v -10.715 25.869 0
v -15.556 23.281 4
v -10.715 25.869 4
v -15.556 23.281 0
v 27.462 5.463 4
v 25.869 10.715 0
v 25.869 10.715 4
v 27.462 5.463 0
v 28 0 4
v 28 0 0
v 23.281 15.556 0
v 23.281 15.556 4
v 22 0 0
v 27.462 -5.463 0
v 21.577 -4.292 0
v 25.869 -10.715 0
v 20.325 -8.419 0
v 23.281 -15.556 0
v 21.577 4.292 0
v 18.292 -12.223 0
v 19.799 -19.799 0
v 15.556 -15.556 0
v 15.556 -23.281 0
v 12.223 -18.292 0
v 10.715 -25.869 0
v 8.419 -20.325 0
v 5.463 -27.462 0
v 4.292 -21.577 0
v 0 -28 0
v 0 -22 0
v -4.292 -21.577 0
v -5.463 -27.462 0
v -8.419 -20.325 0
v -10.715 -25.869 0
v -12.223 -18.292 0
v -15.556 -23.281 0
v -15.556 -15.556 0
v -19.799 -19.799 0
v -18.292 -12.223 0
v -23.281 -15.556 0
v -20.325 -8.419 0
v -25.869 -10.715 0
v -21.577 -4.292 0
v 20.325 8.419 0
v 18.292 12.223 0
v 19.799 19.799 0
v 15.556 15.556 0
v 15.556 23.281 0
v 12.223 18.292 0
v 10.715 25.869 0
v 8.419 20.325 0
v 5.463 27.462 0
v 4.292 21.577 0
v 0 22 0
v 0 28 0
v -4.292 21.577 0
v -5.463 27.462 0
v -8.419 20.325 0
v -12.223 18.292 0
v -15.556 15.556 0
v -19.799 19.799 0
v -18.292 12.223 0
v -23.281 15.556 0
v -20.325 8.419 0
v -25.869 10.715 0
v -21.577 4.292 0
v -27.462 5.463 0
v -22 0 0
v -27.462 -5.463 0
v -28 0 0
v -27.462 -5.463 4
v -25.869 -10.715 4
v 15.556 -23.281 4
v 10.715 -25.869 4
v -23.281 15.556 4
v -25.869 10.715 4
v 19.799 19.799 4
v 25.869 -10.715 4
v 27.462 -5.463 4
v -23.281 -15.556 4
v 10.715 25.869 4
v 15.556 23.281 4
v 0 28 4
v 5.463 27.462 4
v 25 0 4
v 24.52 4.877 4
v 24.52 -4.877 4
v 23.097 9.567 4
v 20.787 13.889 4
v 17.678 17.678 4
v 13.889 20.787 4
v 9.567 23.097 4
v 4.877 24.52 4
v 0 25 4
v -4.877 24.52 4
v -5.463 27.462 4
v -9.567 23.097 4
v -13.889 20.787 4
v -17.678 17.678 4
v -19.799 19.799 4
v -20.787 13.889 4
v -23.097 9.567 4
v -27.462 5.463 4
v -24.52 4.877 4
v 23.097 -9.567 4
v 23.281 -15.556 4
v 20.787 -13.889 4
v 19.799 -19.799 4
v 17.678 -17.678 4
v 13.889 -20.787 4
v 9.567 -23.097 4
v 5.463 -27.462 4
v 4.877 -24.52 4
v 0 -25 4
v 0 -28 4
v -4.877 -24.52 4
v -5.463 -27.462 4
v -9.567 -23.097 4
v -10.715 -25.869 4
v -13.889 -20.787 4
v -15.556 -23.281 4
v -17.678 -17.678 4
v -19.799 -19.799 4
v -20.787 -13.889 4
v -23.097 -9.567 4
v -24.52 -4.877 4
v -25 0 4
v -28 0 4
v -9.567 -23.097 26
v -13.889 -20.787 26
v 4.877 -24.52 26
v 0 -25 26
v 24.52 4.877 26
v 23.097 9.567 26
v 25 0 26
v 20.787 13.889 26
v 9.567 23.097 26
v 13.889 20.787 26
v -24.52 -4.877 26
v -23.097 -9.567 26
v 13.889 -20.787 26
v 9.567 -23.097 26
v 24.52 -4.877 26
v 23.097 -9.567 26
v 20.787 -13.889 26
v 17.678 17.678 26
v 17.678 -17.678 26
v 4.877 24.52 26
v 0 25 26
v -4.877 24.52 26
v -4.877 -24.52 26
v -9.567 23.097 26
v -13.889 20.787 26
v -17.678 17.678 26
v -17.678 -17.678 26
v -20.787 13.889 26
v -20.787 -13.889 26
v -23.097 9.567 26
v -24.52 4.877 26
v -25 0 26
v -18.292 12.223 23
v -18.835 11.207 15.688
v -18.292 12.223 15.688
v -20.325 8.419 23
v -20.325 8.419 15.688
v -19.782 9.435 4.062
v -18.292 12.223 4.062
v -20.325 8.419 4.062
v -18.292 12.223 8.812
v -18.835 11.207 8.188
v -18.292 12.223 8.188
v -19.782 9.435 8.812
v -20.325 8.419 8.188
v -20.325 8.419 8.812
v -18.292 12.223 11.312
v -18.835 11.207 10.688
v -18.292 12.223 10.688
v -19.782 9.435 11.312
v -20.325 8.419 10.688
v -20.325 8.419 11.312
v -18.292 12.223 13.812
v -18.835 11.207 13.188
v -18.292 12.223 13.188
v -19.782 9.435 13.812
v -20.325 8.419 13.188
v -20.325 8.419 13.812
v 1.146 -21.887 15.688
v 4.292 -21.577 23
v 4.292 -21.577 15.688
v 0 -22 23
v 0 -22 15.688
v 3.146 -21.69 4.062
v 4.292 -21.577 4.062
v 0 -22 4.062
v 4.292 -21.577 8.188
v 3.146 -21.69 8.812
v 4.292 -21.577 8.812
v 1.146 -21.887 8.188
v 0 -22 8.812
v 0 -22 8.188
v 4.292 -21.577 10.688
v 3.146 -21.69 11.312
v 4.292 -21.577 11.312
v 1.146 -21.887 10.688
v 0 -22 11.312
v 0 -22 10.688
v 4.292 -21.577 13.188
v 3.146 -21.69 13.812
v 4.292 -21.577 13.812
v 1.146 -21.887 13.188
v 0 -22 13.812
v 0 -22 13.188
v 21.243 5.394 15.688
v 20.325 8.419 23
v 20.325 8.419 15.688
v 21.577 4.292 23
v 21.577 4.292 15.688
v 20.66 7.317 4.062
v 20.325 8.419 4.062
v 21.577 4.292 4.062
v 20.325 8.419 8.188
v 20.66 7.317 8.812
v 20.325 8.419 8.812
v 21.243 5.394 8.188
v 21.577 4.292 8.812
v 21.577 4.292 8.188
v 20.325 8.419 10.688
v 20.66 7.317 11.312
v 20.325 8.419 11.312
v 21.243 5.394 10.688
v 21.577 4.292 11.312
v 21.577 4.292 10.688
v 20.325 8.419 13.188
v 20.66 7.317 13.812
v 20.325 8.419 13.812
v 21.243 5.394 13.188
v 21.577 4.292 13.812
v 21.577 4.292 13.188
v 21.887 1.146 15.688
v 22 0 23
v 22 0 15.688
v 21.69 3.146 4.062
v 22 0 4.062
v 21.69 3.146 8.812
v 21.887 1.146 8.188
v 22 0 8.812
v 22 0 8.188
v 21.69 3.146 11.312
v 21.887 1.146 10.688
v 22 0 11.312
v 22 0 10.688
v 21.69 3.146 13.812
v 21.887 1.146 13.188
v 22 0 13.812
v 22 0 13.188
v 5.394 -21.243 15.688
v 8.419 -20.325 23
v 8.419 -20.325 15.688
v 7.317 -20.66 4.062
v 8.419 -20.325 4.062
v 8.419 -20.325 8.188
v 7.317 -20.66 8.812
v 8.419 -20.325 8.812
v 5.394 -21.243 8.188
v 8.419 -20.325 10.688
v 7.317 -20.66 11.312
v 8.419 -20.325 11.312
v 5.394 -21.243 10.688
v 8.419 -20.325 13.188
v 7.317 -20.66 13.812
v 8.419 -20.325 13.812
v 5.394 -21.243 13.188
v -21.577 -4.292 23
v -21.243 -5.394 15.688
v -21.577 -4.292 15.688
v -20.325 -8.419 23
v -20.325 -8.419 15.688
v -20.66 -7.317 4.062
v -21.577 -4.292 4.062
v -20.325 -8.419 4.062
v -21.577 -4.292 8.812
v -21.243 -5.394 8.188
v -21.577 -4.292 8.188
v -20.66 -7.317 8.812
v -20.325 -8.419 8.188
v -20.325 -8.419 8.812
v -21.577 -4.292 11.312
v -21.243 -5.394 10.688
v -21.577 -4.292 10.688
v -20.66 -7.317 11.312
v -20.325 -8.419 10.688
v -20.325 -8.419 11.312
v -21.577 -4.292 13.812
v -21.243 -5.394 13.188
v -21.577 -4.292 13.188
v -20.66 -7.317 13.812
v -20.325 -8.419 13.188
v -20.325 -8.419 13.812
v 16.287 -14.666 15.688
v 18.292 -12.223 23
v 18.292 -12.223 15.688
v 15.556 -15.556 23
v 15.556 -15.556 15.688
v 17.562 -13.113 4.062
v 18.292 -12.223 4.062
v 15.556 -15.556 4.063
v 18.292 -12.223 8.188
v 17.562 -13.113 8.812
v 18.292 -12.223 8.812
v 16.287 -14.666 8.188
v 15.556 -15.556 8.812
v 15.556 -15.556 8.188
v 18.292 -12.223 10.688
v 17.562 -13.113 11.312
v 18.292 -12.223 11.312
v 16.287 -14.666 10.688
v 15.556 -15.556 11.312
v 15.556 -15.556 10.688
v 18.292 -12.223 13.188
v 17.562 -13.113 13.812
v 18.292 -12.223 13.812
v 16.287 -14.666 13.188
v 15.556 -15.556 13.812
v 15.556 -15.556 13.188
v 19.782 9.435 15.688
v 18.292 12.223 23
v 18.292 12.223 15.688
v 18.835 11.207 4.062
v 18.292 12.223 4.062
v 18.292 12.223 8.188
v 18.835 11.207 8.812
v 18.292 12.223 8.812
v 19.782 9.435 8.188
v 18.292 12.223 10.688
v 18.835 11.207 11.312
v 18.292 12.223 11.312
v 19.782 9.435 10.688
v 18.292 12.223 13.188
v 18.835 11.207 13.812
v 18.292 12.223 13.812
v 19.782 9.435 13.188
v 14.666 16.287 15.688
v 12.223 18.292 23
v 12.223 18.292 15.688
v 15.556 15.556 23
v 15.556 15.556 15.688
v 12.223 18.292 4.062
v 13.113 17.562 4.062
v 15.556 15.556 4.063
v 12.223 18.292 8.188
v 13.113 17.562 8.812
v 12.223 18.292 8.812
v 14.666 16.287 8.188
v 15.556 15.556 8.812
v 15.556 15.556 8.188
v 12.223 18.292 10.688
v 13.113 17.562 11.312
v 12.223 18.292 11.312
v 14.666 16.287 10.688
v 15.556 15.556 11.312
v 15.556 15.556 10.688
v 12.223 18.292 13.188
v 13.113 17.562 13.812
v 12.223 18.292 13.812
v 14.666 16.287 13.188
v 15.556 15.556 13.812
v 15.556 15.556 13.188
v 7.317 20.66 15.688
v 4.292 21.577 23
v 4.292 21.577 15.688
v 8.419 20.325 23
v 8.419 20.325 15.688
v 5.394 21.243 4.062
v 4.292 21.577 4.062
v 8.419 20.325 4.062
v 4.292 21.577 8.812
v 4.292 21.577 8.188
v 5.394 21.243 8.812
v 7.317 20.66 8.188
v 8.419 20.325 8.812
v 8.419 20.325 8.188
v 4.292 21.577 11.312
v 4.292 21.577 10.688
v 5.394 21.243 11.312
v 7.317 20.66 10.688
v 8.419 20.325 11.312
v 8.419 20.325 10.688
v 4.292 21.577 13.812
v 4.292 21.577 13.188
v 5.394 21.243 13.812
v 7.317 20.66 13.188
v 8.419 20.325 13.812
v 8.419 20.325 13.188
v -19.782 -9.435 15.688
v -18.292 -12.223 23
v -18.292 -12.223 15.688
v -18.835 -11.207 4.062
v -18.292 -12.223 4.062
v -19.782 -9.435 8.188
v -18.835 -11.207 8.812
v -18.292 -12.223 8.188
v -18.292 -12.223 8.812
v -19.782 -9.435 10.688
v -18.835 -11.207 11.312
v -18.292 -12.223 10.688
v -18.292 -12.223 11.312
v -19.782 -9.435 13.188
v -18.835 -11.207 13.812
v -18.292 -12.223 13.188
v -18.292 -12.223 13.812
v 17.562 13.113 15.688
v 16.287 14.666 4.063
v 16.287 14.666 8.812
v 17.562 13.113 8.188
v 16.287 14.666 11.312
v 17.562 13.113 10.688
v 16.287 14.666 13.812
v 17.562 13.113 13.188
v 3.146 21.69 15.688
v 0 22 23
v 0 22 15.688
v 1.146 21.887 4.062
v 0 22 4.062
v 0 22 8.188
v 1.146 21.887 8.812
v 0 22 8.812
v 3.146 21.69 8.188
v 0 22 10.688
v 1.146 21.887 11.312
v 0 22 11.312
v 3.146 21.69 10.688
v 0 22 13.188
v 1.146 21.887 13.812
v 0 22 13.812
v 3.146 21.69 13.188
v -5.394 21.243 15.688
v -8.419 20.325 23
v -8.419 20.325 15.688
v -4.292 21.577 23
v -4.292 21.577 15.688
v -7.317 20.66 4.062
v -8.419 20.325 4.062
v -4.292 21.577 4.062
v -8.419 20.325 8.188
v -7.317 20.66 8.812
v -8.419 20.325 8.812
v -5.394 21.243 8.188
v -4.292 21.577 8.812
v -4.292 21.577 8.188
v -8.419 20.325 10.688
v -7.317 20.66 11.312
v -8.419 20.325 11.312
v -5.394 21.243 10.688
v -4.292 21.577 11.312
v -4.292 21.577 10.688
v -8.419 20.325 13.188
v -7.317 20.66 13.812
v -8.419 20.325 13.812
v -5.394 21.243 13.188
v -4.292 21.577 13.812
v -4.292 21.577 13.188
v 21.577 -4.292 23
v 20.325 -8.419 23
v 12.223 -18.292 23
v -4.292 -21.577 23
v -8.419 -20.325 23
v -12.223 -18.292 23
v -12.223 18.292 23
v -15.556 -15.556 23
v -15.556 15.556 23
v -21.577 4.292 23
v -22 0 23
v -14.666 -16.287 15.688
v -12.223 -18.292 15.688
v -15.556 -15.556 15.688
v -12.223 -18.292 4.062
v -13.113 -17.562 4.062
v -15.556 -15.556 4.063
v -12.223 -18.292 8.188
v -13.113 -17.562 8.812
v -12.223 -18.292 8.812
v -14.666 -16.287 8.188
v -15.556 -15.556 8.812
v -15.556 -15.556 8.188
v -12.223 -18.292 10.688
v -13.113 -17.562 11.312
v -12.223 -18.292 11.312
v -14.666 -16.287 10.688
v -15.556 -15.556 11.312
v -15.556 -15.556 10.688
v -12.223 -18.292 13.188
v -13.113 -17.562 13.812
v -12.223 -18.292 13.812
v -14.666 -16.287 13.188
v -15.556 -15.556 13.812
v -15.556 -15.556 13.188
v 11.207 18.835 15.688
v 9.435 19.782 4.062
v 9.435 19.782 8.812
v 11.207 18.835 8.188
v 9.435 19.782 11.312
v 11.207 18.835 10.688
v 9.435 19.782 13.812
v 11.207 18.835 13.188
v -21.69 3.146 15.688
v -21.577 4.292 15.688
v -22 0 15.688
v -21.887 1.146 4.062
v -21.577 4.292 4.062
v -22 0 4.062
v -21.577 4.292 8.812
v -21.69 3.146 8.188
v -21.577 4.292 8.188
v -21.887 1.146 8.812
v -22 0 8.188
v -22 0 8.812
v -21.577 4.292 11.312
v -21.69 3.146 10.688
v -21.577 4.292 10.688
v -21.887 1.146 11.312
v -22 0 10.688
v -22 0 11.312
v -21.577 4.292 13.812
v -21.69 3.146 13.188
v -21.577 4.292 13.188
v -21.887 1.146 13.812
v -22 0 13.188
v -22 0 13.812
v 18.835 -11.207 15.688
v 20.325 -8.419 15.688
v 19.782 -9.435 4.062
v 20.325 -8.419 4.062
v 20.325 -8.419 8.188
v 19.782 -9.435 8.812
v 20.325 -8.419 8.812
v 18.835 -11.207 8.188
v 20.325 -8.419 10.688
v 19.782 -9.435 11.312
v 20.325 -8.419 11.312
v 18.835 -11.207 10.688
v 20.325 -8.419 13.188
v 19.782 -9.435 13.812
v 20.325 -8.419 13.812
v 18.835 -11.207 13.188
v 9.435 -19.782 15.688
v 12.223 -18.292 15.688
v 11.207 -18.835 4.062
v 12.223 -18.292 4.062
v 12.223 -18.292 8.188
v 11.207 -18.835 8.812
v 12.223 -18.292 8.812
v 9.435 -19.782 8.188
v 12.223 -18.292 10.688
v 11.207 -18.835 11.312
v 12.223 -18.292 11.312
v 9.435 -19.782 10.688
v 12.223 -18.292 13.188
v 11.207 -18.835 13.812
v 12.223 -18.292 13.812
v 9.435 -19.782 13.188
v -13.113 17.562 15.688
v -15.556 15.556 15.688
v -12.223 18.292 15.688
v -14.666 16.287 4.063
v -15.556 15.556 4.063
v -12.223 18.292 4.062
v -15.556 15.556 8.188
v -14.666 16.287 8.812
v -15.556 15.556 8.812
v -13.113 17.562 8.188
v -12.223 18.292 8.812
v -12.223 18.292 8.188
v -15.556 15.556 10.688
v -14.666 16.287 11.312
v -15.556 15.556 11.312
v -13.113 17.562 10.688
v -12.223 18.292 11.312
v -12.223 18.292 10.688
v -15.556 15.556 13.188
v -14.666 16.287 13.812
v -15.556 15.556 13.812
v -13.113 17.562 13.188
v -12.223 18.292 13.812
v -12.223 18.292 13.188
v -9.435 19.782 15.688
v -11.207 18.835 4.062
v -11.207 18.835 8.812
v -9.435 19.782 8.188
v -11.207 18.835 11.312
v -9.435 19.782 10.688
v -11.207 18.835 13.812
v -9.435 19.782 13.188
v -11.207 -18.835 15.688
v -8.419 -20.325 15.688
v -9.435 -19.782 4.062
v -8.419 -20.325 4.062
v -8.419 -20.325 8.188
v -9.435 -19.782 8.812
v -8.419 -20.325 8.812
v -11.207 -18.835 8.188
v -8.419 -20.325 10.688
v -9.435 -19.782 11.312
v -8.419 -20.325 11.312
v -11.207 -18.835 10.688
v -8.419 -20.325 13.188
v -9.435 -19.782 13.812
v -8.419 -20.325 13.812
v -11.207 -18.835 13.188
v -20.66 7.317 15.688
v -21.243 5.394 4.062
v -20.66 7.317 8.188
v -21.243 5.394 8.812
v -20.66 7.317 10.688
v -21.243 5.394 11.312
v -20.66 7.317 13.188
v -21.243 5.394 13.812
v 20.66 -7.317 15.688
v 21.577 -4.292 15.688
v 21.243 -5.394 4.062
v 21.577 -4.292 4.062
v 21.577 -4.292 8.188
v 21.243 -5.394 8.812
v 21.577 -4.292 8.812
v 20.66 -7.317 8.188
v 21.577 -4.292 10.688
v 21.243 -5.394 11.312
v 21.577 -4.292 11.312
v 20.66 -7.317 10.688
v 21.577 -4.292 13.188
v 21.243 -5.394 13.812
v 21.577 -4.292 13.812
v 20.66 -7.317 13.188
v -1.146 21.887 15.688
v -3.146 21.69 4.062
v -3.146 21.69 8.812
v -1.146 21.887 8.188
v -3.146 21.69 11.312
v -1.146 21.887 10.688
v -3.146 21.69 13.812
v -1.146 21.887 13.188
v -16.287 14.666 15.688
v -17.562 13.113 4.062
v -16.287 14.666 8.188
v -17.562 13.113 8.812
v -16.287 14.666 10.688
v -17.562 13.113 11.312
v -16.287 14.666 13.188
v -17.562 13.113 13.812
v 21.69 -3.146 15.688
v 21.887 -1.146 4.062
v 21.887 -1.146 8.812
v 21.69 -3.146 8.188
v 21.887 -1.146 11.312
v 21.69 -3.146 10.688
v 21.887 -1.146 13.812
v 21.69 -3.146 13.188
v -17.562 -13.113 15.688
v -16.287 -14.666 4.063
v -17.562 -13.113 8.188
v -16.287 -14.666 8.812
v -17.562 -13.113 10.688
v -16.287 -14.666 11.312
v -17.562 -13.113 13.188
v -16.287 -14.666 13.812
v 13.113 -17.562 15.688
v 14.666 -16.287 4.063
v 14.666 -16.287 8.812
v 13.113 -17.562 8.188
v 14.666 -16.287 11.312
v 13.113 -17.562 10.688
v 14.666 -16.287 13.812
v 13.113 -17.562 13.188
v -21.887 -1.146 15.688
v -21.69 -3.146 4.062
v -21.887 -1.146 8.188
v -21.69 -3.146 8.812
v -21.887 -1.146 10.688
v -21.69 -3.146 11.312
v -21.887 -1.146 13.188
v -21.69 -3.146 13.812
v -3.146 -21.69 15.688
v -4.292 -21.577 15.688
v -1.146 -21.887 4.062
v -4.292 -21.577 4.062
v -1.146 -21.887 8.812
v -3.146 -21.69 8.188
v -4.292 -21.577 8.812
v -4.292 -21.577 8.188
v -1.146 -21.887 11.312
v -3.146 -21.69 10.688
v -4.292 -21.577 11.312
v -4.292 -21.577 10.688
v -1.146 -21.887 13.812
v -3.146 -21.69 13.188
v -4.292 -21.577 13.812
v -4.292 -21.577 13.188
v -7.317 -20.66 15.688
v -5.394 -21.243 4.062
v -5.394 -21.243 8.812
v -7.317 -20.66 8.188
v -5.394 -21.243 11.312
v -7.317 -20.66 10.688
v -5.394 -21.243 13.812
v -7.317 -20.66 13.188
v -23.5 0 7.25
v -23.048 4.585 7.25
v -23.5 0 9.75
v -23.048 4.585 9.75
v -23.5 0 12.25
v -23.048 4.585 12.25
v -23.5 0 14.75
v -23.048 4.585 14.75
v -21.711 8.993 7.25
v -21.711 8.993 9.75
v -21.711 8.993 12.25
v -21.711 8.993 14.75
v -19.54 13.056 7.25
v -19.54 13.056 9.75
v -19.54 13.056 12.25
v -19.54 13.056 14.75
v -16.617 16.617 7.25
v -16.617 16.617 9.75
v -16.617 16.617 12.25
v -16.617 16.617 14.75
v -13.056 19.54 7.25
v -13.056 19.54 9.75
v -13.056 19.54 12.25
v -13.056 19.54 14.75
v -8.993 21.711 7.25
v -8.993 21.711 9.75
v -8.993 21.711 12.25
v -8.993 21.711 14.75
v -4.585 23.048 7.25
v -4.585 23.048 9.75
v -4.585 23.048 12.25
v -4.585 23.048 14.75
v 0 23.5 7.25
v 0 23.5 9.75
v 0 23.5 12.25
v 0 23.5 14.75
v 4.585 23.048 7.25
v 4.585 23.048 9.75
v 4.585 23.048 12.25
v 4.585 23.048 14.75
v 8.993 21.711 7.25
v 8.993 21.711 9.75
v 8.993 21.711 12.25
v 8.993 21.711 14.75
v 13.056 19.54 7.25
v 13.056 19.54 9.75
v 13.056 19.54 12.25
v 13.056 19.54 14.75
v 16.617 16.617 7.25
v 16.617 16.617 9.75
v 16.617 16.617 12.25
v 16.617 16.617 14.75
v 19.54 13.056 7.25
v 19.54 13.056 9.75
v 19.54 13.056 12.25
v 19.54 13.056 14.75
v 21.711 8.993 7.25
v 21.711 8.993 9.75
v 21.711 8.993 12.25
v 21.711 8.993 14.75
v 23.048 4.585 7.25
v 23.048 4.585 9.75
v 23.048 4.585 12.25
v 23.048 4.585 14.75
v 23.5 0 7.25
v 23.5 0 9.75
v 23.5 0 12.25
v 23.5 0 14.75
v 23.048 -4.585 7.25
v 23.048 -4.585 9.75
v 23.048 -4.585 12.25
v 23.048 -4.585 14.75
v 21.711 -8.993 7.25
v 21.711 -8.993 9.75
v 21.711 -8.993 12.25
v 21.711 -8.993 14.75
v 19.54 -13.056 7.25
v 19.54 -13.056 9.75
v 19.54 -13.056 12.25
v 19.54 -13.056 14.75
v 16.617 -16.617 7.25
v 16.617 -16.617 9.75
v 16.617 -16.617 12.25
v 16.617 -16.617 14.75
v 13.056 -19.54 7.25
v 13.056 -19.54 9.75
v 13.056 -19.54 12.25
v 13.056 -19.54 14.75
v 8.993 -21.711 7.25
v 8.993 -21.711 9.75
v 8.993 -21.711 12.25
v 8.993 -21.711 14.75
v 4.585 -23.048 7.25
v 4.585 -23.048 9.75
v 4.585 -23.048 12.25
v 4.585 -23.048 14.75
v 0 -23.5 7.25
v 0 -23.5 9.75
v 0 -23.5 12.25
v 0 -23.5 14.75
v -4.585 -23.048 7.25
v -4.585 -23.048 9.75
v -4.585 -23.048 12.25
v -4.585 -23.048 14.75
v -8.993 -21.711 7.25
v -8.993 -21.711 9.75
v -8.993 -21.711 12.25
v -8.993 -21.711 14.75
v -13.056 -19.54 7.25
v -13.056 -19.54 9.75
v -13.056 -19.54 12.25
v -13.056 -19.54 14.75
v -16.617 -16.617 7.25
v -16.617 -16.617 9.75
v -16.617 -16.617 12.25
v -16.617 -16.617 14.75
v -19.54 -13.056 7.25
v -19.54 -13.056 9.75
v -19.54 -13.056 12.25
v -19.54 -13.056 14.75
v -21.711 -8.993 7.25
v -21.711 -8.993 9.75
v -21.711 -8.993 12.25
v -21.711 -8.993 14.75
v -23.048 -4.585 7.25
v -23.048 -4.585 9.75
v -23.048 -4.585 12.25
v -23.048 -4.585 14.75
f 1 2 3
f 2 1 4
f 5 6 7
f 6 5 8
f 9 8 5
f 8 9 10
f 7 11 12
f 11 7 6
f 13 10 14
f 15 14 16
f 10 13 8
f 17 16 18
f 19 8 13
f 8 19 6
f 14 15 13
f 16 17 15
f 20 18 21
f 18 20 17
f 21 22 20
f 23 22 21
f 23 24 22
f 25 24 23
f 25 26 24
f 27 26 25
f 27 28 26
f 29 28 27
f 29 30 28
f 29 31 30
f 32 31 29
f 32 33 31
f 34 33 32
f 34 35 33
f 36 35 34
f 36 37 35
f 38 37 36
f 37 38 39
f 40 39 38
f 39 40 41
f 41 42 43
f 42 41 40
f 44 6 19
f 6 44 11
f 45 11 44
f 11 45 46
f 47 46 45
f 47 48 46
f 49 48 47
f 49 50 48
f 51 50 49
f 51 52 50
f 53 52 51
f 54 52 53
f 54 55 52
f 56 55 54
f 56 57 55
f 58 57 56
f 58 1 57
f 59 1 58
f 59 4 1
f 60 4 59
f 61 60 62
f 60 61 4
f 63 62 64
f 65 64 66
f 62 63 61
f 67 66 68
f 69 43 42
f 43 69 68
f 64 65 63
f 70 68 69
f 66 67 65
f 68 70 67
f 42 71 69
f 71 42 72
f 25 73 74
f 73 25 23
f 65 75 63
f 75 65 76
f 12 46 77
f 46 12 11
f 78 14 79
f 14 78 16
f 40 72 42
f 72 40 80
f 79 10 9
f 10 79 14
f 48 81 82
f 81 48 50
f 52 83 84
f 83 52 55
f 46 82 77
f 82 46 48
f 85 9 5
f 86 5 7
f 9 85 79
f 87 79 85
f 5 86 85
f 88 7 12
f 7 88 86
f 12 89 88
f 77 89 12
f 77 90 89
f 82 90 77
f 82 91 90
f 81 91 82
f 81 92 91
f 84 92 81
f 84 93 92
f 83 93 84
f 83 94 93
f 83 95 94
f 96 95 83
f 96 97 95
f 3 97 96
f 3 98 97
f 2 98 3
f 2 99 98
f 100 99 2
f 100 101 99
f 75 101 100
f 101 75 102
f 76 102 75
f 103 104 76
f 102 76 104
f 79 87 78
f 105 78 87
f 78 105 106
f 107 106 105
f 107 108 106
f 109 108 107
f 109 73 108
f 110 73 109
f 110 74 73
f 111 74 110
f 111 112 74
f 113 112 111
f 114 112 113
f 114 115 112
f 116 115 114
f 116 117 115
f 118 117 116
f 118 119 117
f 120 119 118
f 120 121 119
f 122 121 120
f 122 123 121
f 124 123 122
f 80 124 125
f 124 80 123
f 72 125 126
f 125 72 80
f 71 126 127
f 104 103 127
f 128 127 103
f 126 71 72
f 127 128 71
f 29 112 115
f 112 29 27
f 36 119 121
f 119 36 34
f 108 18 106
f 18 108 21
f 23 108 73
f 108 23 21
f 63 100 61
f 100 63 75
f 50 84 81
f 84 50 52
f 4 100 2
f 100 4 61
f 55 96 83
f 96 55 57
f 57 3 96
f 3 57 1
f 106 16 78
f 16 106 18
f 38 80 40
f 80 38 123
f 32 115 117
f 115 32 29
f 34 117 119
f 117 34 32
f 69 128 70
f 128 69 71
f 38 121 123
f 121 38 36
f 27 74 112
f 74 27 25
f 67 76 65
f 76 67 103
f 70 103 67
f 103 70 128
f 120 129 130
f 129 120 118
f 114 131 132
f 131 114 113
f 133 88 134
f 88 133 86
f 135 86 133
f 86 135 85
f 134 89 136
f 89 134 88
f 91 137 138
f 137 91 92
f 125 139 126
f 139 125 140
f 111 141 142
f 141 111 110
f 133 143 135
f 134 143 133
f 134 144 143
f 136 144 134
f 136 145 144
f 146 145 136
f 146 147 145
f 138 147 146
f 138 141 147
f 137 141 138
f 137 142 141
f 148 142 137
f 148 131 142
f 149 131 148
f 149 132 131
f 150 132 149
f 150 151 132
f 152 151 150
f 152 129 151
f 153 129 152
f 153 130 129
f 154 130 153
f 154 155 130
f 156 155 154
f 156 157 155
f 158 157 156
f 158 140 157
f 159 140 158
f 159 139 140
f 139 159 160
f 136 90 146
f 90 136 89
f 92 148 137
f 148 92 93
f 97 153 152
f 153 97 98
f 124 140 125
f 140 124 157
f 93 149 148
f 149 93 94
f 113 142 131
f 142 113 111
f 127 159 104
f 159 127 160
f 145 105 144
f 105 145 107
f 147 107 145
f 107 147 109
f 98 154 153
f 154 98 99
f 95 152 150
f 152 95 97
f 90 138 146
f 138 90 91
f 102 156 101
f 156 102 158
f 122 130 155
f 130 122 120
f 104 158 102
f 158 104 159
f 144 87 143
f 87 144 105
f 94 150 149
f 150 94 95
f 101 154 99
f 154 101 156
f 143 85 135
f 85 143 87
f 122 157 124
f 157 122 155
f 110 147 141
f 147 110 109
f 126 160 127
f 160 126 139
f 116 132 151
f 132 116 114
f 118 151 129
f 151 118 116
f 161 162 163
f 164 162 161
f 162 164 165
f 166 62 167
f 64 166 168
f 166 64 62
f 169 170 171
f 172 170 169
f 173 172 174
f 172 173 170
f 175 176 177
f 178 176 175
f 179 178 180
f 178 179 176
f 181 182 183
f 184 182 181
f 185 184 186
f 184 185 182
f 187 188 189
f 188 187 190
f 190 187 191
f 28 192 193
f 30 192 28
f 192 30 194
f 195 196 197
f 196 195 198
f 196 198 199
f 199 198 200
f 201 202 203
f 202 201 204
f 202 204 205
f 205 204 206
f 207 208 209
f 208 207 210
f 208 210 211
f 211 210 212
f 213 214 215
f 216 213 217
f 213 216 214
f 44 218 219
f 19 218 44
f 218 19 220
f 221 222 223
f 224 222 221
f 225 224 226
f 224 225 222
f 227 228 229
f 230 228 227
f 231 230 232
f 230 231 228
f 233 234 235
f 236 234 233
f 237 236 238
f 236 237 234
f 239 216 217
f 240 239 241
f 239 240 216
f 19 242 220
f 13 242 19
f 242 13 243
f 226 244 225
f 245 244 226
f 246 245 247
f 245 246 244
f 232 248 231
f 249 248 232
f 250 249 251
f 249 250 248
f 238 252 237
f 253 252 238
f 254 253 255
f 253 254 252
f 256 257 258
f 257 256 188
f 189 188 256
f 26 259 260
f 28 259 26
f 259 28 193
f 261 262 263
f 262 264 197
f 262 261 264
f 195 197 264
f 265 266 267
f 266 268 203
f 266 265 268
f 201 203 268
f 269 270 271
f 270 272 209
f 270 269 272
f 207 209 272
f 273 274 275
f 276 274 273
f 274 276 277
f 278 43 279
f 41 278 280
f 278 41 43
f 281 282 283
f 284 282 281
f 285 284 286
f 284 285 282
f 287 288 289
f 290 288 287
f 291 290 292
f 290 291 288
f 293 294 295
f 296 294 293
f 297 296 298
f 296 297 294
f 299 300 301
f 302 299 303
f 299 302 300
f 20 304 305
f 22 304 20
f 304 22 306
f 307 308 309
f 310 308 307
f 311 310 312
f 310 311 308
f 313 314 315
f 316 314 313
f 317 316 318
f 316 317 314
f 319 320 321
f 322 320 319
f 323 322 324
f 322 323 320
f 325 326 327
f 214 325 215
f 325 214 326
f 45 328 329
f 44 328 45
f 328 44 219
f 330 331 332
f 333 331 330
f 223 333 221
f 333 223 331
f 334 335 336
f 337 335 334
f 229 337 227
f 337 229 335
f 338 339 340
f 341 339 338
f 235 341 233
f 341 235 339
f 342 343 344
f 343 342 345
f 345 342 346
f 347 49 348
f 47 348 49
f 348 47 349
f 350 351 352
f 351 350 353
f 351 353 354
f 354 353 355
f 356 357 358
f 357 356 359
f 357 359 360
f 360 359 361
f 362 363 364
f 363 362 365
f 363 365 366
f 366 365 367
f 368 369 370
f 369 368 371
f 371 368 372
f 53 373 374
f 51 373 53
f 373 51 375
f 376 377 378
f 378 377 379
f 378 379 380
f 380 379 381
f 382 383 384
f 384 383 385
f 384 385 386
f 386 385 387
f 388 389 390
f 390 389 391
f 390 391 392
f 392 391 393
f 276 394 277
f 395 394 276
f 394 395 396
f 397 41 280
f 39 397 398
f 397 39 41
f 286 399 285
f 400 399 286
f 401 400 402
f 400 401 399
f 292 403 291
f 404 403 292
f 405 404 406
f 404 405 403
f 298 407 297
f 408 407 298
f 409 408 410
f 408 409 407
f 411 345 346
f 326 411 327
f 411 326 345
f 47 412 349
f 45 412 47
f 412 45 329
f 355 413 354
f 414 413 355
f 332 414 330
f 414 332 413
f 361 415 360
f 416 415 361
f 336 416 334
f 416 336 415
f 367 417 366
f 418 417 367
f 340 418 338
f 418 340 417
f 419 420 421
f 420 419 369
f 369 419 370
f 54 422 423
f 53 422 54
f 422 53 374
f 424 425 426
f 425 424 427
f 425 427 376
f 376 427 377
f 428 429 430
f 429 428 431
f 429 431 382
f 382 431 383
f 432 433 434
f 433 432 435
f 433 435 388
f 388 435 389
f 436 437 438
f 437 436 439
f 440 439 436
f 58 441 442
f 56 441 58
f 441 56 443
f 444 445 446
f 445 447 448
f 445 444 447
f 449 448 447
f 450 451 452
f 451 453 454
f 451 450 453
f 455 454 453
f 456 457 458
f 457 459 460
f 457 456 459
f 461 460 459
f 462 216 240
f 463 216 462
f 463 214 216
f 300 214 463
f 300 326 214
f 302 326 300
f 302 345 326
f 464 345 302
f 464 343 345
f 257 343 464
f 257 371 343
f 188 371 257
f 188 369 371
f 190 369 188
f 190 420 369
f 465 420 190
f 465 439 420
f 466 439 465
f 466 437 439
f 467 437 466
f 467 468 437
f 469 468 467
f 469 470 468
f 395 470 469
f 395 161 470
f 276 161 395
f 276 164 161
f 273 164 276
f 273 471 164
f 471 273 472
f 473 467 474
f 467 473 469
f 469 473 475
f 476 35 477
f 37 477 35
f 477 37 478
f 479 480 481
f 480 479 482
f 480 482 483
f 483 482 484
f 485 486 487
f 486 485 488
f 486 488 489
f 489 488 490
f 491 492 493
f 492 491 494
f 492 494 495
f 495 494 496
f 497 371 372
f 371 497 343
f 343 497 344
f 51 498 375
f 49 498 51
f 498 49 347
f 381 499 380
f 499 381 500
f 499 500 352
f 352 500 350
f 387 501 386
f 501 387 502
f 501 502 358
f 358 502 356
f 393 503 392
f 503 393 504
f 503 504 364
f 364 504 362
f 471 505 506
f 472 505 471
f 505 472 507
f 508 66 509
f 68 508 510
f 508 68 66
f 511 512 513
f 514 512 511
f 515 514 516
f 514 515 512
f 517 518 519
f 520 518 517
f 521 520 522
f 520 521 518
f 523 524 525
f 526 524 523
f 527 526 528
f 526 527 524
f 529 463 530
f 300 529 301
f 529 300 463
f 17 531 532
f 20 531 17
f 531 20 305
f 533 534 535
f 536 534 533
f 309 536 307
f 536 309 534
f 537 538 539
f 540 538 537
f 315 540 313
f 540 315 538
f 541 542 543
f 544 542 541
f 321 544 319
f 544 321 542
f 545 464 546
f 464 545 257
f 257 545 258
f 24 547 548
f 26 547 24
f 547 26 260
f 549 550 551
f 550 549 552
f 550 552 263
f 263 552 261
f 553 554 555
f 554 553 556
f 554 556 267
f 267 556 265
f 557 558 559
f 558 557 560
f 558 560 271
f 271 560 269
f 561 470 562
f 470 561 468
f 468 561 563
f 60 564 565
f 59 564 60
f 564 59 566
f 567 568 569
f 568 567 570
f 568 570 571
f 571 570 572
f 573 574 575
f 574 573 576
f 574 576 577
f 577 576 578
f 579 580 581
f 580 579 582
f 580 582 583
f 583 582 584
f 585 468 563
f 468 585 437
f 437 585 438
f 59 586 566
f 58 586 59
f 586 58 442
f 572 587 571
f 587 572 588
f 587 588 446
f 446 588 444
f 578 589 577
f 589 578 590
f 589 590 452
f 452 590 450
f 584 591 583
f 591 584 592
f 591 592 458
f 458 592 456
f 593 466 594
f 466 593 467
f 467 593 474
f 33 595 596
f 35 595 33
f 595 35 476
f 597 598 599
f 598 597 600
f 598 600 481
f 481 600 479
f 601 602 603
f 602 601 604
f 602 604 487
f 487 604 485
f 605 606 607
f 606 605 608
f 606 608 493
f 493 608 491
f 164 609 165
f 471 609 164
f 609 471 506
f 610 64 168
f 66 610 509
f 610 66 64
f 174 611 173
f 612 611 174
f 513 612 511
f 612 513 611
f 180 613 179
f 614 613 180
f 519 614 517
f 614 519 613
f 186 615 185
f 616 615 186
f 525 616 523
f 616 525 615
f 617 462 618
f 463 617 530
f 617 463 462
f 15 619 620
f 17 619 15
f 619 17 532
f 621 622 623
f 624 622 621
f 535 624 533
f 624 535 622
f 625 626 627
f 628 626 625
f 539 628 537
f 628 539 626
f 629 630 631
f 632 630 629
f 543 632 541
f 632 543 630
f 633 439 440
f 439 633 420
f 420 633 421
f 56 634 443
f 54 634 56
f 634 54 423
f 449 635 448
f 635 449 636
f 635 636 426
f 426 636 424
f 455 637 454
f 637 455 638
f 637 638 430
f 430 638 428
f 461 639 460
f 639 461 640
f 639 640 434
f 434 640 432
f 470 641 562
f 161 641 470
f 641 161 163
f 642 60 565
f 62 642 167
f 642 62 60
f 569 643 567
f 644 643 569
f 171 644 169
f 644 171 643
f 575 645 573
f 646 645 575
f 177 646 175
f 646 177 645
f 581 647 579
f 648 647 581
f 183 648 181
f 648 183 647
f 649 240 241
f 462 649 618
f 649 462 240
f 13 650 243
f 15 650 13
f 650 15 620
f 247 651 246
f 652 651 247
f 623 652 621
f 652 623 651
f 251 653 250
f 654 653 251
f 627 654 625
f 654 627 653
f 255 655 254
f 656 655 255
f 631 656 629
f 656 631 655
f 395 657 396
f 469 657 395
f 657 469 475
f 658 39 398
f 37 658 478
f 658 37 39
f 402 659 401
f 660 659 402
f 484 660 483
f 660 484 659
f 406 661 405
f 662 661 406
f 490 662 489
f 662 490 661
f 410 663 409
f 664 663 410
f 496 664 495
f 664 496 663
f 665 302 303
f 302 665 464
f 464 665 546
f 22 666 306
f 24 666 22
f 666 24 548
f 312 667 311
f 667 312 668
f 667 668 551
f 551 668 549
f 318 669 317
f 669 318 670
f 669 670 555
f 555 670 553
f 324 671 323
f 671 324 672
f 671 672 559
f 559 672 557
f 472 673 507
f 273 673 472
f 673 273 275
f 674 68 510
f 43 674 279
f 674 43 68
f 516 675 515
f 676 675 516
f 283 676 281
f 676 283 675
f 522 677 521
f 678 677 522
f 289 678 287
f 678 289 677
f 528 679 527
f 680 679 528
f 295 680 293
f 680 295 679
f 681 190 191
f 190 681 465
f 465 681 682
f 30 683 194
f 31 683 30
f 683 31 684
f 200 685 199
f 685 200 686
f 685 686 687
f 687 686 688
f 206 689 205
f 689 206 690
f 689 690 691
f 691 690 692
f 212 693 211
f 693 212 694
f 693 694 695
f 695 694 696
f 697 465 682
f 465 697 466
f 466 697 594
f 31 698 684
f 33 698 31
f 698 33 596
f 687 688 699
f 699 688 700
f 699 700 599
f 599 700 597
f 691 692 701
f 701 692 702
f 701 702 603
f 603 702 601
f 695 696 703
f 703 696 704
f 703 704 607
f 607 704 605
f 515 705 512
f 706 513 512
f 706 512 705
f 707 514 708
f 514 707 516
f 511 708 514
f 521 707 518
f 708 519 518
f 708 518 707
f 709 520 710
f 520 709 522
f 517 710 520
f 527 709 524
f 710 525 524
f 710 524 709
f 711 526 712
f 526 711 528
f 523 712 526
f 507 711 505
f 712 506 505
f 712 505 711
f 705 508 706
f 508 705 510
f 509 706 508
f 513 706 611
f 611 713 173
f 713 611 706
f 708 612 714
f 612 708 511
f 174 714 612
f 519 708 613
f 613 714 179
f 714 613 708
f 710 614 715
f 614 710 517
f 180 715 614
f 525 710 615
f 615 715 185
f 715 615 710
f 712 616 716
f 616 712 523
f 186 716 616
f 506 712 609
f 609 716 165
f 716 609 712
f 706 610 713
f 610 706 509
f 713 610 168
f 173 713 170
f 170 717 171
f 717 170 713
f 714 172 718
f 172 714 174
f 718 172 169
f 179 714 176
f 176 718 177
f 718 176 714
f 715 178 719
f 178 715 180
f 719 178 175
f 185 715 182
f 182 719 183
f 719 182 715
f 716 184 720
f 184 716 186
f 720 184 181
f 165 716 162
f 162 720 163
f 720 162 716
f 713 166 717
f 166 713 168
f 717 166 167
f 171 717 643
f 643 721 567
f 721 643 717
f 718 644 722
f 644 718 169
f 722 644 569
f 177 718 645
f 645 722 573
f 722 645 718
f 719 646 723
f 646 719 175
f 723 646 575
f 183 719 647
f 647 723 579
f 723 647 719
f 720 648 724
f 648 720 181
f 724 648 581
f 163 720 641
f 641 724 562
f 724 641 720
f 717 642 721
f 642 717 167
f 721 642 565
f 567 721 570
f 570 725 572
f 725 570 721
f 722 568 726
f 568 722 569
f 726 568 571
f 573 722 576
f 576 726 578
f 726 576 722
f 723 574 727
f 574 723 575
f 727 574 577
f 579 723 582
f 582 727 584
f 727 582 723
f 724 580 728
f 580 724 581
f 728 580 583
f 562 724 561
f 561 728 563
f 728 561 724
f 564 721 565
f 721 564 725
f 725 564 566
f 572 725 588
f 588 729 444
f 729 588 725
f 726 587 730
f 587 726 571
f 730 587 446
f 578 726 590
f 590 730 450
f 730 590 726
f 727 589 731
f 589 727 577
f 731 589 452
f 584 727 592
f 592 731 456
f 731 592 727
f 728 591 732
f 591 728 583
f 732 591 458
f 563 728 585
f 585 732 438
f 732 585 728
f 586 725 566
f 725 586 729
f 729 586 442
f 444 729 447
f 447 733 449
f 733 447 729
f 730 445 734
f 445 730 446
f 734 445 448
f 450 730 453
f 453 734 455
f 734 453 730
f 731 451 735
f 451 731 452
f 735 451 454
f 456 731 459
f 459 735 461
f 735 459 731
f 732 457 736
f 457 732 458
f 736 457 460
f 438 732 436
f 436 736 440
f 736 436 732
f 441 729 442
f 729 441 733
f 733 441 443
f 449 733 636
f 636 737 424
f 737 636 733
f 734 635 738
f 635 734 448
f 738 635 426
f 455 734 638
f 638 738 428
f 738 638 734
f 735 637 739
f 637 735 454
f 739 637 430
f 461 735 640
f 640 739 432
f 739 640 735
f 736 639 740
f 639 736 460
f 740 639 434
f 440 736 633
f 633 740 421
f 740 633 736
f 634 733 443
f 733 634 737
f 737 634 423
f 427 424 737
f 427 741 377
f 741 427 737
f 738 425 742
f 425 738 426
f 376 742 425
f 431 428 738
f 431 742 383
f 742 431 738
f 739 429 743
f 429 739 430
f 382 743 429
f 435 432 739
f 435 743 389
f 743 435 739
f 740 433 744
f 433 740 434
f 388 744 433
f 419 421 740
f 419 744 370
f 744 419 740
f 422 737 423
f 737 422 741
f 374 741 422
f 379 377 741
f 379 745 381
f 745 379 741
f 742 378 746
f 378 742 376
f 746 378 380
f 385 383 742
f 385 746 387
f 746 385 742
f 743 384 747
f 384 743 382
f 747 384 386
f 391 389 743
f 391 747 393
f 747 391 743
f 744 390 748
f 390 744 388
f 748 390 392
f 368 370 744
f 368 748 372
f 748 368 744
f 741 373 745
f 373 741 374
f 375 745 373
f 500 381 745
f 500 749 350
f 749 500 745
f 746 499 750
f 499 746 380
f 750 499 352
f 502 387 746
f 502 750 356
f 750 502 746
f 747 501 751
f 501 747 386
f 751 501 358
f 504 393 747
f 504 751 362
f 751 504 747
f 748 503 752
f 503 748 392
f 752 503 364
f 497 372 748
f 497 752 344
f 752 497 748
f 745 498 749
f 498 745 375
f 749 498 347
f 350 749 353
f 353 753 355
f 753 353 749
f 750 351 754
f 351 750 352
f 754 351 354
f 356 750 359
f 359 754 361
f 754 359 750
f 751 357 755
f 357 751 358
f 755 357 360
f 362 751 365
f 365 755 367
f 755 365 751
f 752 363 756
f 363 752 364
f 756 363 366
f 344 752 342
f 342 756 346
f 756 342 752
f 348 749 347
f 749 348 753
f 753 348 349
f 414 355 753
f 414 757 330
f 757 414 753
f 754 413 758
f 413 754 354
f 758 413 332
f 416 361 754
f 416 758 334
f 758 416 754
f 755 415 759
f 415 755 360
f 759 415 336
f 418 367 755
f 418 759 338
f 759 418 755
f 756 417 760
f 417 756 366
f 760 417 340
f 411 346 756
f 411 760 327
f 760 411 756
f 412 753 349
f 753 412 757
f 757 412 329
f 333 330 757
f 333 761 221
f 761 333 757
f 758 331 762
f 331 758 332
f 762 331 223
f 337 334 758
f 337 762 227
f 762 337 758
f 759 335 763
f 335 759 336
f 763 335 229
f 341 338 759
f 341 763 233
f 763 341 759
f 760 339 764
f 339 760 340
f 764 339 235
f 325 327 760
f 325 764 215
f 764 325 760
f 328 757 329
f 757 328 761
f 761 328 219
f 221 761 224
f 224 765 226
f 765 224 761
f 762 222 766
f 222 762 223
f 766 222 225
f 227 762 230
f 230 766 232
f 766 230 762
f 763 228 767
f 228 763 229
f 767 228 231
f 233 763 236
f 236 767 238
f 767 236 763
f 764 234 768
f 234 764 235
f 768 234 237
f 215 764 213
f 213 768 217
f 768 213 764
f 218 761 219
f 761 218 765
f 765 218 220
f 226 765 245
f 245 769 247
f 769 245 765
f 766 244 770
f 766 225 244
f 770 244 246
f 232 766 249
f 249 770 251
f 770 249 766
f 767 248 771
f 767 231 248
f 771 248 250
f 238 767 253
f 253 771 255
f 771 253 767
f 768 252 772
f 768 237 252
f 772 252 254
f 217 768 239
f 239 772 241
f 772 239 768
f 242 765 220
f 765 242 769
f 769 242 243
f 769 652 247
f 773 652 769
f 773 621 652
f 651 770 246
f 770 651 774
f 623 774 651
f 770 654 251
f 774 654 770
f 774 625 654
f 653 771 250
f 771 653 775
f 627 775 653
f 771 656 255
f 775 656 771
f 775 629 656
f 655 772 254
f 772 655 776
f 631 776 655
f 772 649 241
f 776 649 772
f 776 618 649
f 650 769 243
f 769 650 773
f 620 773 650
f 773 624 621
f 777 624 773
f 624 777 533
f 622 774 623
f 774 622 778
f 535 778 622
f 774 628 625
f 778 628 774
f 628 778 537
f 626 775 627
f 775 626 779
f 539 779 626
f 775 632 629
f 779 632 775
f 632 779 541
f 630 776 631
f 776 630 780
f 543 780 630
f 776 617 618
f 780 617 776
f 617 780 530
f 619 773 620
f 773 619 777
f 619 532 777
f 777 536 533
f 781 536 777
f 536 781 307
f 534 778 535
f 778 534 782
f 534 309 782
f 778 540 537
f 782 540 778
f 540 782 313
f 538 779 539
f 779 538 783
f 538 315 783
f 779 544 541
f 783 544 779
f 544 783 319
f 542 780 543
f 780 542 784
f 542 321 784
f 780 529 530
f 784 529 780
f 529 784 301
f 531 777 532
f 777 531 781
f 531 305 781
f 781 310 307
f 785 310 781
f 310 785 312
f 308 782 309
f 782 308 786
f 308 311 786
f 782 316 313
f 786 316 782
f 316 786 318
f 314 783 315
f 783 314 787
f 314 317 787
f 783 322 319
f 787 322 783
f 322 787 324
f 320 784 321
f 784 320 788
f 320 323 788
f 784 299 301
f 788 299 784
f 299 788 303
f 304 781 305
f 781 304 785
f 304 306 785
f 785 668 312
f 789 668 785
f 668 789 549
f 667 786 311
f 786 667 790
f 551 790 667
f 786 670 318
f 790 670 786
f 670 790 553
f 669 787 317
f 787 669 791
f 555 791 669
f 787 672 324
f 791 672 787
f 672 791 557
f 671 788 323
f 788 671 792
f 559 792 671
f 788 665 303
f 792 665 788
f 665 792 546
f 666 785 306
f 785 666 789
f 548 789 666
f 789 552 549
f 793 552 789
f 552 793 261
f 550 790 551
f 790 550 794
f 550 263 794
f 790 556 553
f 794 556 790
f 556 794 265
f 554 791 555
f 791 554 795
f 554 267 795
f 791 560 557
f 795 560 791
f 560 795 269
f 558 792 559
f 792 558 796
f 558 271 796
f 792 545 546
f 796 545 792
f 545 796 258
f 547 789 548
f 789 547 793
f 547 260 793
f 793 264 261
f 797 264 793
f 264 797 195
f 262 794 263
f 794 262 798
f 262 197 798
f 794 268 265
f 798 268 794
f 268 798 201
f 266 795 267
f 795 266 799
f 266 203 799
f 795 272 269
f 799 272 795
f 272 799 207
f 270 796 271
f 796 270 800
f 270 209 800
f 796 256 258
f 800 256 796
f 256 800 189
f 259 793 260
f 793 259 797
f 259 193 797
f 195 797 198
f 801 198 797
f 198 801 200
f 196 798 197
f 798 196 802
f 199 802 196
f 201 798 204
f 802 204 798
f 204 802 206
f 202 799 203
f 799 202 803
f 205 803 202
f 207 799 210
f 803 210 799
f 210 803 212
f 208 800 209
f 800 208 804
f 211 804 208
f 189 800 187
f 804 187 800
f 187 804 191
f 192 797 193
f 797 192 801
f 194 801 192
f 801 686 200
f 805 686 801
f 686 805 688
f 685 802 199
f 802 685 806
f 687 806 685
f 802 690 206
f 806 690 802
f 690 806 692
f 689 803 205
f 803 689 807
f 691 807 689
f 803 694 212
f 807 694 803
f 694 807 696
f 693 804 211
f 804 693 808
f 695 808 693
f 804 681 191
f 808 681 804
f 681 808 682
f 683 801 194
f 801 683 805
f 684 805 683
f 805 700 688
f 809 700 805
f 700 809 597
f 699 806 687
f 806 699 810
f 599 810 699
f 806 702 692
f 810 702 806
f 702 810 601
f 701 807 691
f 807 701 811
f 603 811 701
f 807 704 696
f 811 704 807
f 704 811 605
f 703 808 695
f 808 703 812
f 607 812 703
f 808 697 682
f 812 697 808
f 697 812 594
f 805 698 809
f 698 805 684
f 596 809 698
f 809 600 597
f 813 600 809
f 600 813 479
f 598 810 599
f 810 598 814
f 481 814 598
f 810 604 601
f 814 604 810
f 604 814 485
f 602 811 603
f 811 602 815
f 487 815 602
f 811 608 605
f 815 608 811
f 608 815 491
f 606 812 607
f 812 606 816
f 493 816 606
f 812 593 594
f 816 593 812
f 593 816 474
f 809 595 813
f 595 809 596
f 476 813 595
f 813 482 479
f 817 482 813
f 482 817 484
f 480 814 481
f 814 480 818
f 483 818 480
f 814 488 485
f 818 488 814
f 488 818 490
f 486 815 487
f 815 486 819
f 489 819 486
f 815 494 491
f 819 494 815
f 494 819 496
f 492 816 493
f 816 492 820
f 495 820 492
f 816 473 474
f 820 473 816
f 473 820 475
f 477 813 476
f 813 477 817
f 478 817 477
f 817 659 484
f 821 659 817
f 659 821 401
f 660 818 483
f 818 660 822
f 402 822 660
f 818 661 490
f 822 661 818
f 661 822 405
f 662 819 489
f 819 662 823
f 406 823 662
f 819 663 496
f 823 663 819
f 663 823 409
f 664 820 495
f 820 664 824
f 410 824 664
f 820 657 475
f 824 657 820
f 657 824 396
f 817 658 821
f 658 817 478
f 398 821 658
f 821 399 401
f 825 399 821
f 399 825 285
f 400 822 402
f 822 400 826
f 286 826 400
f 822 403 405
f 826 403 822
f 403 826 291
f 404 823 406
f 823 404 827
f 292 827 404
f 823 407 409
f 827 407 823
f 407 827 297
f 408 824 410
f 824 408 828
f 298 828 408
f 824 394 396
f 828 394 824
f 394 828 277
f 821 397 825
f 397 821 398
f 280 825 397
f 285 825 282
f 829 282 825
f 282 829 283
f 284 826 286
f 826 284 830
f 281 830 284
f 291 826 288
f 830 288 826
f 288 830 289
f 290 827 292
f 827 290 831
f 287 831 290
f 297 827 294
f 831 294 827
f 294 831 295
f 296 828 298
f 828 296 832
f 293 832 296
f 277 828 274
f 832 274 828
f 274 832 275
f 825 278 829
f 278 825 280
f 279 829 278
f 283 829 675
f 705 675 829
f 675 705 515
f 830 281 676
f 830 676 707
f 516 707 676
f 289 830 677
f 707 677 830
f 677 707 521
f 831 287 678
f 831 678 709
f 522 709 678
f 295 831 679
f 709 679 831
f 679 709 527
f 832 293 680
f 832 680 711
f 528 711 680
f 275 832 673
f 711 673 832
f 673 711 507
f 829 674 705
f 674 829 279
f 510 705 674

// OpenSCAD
$fn = 32;

// ----------------------------------------------------------------------
// Threaded cap: 50 mm body, 22 mm tall, 44 mm threaded bore
// ----------------------------------------------------------------------

// --- parameters (mm) ---
outer_d = 50;             // cap outside diameter
body_h = 22;              // cap height
top_t = 3;                // closed top thickness
bore_d = 44;              // bore core diameter
pitch = 2.5;              // thread pitch
thread_d = 1.5;           // thread depth
thread_z = 3;             // thread start above the rim
thread_h = 13;            // threaded height
flange_d = 56;            // flange diameter
flange_t = 4;             // flange thickness

difference() {
  union() {
    cylinder(h = 4, d = flange_d);
    translate([0, 0, 3.5]) cylinder(h = 22.5, d = outer_d);
  }
  /* threaded bore, closed at the top */
  translate([0, 0, -2.5]) cylinder(h = 25.5, d = bore_d);
  translate([0, 0, 3]) rotate_extrude() polygon([[21, 0], [21, 13], [21.5, 13], [23.5, 11.75], [21.5, 10.5], [23.5, 9.25], [21.5, 8], [23.5, 6.75], [21.5, 5.5], [23.5, 4.25], [21.5, 0], [21, 0]]);
}
